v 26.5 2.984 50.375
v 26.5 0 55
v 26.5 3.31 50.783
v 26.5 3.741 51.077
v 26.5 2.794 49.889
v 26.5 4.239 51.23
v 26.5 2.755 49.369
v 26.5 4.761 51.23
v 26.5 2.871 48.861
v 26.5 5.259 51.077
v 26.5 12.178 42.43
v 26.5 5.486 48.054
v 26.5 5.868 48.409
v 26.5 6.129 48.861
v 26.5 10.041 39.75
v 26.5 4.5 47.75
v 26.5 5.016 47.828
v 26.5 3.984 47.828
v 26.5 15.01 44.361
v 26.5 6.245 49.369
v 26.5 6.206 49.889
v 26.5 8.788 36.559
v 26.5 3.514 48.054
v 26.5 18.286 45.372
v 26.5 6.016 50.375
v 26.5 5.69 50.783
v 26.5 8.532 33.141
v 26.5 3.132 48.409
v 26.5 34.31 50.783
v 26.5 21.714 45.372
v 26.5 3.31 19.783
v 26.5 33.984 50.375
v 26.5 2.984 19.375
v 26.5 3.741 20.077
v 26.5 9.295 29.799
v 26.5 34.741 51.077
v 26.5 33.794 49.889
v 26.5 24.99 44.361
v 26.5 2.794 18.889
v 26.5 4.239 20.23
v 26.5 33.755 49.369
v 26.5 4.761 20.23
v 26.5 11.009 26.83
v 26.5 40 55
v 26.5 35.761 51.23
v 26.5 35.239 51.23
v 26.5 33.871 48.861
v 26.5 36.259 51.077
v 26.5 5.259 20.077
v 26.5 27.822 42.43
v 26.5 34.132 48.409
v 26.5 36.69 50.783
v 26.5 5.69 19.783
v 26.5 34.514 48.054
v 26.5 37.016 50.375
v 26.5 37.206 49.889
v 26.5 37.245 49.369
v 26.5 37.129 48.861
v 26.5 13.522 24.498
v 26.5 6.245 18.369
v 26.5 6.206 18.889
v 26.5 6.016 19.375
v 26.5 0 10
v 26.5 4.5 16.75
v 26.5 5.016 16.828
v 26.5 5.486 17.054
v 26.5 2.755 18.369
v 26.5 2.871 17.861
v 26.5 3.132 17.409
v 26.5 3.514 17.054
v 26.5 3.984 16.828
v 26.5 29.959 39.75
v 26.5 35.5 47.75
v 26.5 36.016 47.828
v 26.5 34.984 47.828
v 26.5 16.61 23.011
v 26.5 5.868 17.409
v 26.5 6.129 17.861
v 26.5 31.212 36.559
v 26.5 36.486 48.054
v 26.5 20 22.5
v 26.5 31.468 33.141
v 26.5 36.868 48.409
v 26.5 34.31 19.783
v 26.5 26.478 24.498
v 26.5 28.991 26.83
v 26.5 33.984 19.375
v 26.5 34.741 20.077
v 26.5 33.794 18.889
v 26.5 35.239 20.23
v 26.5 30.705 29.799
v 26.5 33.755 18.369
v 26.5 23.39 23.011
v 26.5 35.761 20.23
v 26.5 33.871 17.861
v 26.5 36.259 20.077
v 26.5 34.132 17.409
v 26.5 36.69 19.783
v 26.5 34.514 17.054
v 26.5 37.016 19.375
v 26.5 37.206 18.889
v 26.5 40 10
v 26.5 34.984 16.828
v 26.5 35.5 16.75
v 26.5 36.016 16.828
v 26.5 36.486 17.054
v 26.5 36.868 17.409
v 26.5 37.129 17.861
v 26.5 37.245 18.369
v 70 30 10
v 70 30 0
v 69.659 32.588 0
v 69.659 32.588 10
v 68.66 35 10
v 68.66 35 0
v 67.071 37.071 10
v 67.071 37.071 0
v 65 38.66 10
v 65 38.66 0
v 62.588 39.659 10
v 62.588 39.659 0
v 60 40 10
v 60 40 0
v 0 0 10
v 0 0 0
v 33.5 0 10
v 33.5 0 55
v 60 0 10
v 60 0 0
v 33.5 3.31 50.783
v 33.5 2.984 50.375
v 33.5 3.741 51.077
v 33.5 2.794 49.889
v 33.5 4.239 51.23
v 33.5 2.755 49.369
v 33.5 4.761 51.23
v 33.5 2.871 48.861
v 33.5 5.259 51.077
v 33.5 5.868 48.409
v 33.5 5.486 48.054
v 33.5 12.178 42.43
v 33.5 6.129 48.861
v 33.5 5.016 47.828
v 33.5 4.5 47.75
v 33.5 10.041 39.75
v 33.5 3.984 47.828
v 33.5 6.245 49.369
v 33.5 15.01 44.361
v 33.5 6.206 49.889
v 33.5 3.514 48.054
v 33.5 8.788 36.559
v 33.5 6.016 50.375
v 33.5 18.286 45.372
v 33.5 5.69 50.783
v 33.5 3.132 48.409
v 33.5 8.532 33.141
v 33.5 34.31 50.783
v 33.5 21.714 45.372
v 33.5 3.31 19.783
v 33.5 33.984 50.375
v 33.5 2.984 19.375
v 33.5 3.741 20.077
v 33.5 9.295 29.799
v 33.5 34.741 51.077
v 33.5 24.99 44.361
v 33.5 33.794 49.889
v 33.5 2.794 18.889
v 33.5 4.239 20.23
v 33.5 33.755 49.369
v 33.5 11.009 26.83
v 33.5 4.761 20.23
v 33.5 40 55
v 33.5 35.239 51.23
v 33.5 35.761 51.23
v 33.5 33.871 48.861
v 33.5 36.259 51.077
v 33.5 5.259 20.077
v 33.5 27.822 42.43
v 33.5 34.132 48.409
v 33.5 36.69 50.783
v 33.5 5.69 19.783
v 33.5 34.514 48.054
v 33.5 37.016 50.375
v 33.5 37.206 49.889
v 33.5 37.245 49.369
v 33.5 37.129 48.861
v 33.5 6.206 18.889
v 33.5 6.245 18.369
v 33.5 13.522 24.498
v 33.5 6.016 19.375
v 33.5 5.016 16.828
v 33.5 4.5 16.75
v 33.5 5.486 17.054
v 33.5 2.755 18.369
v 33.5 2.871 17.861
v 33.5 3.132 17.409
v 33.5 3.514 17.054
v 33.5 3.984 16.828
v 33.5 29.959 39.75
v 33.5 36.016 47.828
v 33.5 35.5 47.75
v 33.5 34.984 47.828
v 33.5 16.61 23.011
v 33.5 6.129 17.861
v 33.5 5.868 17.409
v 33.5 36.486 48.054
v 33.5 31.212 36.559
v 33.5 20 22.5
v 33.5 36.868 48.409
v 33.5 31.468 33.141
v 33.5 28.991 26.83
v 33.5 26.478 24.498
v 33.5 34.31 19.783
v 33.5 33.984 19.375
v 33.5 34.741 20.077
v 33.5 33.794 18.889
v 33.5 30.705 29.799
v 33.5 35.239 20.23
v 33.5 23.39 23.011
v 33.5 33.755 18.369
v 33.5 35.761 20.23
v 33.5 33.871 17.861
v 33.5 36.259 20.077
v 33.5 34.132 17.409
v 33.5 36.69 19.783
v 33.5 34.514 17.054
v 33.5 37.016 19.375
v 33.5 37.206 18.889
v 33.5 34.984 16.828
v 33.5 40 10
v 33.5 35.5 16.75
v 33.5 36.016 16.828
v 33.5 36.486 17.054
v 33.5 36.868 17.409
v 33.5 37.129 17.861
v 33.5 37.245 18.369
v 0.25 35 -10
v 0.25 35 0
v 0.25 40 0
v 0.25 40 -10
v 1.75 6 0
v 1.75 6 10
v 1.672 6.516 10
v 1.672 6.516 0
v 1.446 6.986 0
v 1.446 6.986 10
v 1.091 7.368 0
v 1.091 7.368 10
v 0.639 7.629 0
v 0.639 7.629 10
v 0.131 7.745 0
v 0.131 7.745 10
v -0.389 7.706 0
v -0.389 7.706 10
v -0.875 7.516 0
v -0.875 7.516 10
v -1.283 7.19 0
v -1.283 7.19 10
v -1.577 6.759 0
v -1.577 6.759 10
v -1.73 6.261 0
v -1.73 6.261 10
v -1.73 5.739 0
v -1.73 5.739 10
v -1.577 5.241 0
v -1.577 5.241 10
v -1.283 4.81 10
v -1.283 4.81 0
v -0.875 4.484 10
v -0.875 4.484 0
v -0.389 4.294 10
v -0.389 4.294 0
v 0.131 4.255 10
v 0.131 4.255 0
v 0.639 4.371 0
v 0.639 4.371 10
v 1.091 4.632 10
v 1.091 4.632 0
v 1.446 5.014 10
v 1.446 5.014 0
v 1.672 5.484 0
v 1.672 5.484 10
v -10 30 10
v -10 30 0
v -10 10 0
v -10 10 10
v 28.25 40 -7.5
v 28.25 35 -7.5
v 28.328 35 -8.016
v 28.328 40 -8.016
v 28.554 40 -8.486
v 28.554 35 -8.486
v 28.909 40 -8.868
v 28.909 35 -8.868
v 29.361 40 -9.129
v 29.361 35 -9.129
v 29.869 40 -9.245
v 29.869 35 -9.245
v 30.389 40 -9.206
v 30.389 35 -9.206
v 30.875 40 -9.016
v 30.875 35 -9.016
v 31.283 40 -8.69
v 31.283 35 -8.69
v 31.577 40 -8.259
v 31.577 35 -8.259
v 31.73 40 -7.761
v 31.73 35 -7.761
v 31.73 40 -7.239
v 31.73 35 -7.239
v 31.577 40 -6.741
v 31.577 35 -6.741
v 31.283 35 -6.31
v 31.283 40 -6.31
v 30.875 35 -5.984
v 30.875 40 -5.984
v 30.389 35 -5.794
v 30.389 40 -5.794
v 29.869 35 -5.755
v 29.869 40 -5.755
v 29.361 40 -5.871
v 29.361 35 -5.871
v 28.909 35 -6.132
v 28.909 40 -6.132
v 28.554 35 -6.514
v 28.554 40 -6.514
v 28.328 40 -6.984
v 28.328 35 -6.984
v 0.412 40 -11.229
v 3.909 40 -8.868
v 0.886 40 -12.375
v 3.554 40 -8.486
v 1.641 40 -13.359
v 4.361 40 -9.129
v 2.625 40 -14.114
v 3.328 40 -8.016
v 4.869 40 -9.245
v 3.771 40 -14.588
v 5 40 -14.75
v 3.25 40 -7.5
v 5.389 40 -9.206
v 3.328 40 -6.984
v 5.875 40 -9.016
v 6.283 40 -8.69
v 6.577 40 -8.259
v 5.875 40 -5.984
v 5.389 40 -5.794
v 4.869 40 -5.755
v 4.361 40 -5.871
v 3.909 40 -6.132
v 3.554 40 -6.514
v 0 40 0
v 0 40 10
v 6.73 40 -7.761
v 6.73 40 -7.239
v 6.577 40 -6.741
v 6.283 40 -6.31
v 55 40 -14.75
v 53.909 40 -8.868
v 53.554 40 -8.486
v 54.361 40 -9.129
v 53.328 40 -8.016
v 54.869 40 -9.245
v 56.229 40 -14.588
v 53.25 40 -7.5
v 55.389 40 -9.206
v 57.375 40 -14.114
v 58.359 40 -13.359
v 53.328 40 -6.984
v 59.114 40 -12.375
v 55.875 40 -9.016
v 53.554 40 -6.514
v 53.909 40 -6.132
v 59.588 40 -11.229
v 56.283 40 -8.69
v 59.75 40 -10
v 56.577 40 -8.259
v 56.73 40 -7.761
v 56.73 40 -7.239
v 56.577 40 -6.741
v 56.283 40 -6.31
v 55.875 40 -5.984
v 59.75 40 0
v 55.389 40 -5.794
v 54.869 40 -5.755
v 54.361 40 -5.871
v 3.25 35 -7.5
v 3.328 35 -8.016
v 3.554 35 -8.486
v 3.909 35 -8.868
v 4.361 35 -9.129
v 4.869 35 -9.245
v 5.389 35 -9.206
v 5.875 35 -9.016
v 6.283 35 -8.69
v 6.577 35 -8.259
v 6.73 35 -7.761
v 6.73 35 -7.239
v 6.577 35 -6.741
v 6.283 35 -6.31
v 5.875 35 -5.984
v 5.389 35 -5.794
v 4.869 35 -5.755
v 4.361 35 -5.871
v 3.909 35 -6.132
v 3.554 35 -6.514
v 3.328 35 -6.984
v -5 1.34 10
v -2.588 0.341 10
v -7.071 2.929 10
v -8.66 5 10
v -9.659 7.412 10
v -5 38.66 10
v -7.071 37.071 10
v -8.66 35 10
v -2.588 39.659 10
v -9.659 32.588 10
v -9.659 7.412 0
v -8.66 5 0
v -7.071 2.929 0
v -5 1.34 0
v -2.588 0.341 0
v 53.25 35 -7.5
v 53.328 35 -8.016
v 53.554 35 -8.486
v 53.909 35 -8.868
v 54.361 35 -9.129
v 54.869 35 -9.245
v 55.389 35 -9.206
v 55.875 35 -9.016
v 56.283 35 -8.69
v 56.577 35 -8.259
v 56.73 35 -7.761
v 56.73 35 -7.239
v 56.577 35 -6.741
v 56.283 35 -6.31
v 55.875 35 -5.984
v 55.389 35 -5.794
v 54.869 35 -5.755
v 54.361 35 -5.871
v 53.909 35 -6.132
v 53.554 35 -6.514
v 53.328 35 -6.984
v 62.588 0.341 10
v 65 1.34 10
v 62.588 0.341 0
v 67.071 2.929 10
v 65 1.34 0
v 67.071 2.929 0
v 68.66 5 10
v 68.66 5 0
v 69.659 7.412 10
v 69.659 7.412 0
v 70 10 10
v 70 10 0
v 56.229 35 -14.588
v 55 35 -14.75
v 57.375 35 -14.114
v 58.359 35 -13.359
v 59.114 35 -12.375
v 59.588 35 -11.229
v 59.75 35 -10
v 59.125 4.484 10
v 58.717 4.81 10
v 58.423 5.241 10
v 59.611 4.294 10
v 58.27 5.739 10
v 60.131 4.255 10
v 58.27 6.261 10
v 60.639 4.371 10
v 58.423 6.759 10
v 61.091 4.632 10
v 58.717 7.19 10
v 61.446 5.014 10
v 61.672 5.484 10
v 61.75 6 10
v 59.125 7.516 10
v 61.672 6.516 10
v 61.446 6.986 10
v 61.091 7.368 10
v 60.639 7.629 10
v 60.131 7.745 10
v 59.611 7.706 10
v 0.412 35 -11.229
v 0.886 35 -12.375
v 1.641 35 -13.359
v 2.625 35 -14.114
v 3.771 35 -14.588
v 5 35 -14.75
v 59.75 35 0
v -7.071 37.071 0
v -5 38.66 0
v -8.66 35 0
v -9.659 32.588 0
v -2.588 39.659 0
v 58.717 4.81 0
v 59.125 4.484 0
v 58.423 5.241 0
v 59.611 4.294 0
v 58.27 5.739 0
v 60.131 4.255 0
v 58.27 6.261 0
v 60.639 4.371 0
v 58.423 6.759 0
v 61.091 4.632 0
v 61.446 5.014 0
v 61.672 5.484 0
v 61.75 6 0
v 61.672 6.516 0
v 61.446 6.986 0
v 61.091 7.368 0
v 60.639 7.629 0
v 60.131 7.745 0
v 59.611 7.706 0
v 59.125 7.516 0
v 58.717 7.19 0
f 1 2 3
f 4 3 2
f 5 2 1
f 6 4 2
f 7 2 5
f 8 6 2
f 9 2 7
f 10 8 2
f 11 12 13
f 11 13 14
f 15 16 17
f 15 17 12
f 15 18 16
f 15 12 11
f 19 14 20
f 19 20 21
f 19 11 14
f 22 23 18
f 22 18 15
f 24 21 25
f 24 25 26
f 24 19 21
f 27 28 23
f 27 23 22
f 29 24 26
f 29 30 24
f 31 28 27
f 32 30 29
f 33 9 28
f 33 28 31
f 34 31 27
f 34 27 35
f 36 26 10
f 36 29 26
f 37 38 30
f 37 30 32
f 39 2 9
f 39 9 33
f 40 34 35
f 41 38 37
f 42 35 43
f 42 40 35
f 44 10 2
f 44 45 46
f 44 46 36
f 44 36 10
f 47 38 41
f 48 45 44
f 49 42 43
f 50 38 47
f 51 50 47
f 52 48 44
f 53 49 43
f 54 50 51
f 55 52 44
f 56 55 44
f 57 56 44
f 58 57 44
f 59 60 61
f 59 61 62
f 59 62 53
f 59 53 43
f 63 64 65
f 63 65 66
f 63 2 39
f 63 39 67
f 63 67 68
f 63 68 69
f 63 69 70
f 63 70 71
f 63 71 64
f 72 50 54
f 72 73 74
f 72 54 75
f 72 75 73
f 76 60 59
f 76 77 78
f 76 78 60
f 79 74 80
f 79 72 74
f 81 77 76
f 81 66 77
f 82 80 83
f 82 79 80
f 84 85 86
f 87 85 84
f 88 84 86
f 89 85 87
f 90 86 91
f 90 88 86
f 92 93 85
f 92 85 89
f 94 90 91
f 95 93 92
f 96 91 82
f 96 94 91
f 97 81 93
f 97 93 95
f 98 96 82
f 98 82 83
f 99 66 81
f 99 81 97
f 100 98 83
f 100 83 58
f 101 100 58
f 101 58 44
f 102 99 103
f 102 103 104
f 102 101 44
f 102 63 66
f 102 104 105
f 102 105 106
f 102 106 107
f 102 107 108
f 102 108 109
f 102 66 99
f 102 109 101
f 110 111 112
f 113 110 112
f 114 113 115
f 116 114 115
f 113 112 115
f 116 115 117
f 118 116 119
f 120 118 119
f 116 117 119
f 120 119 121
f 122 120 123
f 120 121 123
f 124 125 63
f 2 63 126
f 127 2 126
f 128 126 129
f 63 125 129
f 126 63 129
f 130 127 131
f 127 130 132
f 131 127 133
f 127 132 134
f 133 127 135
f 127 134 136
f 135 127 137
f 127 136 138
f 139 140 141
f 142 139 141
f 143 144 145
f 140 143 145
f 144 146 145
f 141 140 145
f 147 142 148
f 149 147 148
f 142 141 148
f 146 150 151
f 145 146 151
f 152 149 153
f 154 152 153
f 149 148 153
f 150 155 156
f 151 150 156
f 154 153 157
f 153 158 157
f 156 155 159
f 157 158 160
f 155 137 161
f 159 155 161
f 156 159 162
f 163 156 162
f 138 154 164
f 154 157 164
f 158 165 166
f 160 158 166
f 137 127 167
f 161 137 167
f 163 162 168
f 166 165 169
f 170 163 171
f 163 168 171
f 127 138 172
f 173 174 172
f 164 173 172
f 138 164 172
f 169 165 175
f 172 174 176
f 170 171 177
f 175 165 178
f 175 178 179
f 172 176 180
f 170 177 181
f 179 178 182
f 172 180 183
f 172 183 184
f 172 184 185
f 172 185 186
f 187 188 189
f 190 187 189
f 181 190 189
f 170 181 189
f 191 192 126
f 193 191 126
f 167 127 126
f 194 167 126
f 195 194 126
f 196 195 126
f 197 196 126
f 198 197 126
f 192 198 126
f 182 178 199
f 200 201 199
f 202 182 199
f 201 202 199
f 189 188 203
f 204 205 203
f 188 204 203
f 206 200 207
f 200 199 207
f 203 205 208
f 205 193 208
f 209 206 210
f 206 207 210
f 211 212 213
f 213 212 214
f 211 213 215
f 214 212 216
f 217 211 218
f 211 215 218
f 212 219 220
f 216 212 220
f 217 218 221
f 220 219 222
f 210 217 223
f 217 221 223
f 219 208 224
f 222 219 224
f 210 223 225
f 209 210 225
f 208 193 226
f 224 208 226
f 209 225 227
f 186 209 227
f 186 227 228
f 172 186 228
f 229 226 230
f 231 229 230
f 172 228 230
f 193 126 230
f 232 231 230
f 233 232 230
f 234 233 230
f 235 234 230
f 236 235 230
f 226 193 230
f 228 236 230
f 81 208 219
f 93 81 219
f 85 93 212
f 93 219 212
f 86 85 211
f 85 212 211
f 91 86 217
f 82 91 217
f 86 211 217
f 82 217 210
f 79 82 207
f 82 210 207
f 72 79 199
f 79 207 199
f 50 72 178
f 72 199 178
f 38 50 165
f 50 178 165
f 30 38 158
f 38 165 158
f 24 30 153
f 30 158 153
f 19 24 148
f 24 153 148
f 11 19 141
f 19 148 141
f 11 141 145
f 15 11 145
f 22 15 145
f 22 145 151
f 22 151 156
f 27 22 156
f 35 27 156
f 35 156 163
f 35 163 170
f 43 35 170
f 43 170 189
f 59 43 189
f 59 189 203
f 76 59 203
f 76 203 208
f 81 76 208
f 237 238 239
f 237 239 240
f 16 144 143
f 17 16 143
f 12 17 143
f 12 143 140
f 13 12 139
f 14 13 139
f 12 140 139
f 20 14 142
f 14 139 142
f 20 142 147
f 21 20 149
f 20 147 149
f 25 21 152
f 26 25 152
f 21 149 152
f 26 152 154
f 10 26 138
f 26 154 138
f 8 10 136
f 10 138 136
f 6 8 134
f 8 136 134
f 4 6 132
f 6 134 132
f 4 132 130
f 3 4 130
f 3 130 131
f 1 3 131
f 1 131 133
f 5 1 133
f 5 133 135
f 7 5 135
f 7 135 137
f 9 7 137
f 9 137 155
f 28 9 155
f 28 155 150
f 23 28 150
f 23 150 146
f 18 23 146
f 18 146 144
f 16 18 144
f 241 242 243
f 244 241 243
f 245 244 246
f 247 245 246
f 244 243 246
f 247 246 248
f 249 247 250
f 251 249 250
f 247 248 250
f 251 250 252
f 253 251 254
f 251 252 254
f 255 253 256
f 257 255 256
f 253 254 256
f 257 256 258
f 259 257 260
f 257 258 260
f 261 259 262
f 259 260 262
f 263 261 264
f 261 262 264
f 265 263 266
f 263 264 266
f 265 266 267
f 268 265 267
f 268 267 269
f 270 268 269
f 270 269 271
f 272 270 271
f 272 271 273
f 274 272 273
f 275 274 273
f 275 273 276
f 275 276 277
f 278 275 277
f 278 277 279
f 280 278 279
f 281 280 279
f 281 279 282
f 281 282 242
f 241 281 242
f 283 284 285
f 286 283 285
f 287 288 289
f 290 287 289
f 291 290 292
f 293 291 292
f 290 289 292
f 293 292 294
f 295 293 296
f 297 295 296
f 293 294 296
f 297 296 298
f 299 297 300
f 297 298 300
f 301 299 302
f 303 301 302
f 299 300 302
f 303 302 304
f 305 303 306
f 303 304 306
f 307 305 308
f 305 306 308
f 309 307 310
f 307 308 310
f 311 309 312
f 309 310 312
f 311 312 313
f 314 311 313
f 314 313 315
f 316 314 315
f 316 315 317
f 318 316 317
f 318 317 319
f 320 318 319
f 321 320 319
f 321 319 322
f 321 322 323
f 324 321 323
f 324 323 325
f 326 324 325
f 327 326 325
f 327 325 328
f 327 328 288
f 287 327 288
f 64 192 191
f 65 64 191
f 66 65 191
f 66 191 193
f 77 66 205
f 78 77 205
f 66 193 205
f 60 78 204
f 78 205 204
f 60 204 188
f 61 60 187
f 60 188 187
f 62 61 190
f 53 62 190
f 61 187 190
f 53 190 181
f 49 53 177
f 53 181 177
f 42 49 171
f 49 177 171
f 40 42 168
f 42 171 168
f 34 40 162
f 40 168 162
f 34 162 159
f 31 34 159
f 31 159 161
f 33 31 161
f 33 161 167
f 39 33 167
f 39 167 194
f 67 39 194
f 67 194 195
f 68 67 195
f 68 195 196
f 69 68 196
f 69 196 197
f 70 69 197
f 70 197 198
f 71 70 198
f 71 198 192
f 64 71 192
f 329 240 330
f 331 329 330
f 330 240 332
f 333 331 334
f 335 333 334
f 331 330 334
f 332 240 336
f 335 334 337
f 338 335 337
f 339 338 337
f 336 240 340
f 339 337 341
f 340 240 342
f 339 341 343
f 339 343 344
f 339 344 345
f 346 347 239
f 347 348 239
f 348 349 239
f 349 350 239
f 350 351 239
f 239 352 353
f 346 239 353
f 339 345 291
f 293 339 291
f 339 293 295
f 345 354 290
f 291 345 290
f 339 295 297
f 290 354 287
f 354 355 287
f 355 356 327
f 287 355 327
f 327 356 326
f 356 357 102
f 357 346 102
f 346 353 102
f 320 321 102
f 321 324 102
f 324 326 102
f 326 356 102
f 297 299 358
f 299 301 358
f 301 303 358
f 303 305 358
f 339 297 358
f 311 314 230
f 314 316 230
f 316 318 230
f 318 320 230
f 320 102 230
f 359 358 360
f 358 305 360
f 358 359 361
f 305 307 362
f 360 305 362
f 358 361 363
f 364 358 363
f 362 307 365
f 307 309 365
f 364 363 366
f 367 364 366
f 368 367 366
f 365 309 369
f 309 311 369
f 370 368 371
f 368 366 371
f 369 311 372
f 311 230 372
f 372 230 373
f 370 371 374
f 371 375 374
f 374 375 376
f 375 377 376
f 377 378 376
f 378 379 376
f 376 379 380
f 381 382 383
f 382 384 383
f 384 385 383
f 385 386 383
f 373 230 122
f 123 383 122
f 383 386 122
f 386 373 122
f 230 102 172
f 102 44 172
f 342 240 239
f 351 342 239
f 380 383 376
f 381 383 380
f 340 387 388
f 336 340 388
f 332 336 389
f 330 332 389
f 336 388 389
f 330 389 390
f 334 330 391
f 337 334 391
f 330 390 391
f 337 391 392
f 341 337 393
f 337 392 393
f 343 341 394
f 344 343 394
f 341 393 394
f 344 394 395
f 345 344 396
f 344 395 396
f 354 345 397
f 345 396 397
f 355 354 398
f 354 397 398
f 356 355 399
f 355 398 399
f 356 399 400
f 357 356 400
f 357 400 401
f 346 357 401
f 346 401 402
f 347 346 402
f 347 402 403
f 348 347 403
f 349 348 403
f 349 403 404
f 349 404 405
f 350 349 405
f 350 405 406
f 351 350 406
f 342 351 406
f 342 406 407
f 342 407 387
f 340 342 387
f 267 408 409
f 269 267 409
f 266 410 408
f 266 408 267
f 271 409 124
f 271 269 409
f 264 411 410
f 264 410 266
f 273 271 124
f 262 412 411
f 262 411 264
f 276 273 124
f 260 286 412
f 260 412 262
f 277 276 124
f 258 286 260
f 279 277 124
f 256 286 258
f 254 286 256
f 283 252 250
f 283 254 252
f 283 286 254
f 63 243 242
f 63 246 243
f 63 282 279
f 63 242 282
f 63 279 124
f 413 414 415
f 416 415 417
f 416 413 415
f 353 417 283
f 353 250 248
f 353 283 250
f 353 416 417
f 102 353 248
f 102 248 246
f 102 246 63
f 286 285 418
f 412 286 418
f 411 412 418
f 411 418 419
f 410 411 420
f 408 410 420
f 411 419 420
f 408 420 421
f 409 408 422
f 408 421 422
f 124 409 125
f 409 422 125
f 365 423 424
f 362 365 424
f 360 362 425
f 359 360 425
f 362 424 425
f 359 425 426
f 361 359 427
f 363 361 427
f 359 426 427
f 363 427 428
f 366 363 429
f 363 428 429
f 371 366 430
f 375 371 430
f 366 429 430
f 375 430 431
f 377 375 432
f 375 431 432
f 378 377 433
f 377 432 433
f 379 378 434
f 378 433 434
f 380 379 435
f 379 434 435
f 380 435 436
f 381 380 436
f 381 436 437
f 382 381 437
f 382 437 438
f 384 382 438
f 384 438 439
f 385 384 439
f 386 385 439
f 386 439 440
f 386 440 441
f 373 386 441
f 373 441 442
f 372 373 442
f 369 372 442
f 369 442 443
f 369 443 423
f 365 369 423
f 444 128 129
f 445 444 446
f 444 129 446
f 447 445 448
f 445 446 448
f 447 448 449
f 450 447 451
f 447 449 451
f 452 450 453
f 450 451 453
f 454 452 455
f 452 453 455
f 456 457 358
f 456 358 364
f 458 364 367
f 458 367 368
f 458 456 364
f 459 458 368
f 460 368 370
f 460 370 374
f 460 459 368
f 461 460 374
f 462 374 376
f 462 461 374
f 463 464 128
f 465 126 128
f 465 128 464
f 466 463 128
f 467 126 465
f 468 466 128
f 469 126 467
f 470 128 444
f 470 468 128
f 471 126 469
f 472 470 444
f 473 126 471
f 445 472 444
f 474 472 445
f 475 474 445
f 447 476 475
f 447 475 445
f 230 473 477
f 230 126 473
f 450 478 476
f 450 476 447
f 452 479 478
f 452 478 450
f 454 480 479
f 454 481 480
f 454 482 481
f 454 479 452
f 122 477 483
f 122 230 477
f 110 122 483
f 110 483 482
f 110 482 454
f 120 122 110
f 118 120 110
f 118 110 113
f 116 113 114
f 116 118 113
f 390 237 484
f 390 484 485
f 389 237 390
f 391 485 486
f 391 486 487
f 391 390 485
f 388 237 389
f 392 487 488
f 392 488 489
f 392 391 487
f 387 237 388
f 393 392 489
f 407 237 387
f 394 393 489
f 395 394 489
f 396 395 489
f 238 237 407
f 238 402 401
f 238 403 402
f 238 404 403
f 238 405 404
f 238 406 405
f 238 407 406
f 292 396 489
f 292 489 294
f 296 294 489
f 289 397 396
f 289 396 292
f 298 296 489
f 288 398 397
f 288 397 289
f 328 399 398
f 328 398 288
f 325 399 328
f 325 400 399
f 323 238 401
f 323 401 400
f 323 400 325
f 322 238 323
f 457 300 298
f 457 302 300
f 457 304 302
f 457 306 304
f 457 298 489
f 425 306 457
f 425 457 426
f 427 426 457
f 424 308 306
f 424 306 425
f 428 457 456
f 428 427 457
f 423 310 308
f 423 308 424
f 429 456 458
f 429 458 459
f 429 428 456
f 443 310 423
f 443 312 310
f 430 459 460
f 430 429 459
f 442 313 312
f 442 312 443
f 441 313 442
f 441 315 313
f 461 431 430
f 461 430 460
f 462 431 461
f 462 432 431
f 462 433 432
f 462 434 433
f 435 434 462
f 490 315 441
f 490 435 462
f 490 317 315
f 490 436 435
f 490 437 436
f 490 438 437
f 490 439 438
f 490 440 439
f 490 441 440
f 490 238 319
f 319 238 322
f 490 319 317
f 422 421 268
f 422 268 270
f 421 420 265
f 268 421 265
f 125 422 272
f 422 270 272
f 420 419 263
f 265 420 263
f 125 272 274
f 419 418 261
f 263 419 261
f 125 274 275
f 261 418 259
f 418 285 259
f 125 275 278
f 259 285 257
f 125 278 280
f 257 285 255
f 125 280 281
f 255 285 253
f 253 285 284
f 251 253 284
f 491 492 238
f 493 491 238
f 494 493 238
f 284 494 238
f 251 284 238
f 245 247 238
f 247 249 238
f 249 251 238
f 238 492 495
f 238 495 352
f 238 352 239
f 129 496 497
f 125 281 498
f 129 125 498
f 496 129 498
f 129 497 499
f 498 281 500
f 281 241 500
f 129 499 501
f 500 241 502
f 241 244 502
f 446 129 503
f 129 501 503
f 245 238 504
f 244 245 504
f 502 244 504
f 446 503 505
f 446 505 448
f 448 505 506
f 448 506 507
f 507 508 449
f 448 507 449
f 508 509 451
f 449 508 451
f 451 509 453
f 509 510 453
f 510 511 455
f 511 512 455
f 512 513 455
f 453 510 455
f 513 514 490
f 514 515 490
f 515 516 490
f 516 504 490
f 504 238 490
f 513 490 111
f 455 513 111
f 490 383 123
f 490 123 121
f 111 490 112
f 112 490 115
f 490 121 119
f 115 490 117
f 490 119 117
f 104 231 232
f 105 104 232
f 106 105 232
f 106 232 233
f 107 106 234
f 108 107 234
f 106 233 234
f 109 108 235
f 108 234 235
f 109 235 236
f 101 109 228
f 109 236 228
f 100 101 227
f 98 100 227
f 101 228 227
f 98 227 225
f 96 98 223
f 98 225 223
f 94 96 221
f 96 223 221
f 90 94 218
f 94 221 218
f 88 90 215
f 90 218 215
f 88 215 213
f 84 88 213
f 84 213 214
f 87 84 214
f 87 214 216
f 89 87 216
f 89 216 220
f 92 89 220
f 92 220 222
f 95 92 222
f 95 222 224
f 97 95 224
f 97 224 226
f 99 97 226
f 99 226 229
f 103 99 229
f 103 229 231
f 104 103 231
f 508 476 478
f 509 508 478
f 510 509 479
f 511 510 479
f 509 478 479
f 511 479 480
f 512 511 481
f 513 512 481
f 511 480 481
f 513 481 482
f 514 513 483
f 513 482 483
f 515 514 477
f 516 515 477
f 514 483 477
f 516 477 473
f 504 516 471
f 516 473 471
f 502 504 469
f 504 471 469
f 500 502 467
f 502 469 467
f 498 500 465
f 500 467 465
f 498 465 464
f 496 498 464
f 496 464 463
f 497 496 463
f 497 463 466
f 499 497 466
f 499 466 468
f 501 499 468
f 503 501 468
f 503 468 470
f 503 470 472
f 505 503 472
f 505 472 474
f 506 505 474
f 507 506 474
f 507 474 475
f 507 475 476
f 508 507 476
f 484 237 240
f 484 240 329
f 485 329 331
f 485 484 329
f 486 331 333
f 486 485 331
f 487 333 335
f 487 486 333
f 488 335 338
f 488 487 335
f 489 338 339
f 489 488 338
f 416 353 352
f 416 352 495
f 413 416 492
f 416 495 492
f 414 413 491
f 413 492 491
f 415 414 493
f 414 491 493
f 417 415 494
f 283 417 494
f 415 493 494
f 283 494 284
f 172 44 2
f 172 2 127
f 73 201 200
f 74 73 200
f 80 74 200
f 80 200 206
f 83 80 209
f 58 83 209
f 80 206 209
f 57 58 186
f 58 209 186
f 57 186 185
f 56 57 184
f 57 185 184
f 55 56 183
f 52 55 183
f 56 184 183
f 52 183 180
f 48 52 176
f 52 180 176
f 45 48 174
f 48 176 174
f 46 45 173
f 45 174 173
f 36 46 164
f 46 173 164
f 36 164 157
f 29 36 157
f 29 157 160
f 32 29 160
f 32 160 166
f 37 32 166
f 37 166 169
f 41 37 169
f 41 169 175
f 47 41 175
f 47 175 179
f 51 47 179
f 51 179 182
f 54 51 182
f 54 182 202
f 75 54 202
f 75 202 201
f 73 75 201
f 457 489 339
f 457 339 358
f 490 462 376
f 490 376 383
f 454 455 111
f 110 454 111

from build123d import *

# Parameters (mm, degrees)
BOSS_EXTRUDE1_DEPTH = 10
SKETCH2_W           = 60
SKETCH2_H           = 5
BOSS_EXTRUDE2_DEPTH = 25
FILLET1_R           = 5
SKETCH3_R           = 1.75
CUT_EXTRUDE1_DEPTH  = 25
SKETCH4_R           = 1.75
CUT_EXTRUDE2_DEPTH  = 25
CUT_EXTRUDE3_DEPTH  = 25
SKETCH6_W           = 7
SKETCH6_H           = 40
BOSS_EXTRUDE3_DEPTH = 45
SKETCH7_R           = 11.5
SKETCH7_R_2         = 1.75
CUT_EXTRUDE4_DEPTH  = 45


with BuildPart() as part:
    # Sketch1 → Boss-Extrude1 (new body)
    with BuildSketch(Plane.XY):
        with BuildLine():
            Line((60, 35), (0, 35))
            Line((0, 35), (0, 40))
            ThreePointArc((0, 40), (-7.071067812, 37.071067812), (-10, 30))
            Line((-10, 30), (-10, 10))
            ThreePointArc((-10, 10), (-7.071067812, 2.928932188), (0, 0))
            Line((0, 0), (60, 0))
            ThreePointArc((60, 0), (67.071067812, 2.928932188), (70, 10))
            Line((70, 10), (70, 30))
            ThreePointArc((70, 30), (67.071067812, 37.071067812), (60, 40))
            Line((60, 40), (60, 35))
        make_face()
    extrude(amount=BOSS_EXTRUDE1_DEPTH)

    # Sketch2 → Boss-Extrude2 (add)
    with BuildSketch(Plane.XY.offset(10)):
        with Locations((30, 37.5)):
            Rectangle(SKETCH2_W, SKETCH2_H)
    extrude(amount=-BOSS_EXTRUDE2_DEPTH)

    # Fillet1
    fillet1_edges = [part.edges().sort_by_distance(p)[0] for p in [
        (0, 37.5, -15),
        (60, 37.5, -15),
    ]]
    fillet(fillet1_edges, radius=FILLET1_R)

    # Sketch3 → Cut-Extrude1 (cut)
    with BuildSketch(Plane.XY.offset(10)):
        with Locations((0, 6)):
            Circle(SKETCH3_R)
        with Locations((60, 6)):
            Circle(SKETCH3_R)
    extrude(amount=-CUT_EXTRUDE1_DEPTH, mode=Mode.SUBTRACT)

    # Sketch4 → Cut-Extrude2 (cut)
    with BuildSketch(Plane(origin=(0, 35, 0), x_dir=(-1, 0, 0), z_dir=(0, -1, 0))):
        with Locations((-55, 7.5)):
            Circle(SKETCH4_R)
        with Locations((-30, 7.5)):
            Circle(SKETCH4_R)
        with Locations((-5, 7.5)):
            Circle(SKETCH4_R)
    extrude(amount=-CUT_EXTRUDE2_DEPTH, mode=Mode.SUBTRACT)

    # Sketch5 → Cut-Extrude3 (cut)
    with BuildSketch(Plane.XZ.offset(-35)):
        with BuildLine():
            Line((5, -14.75), (55, -14.75))
            ThreePointArc((55, -14.75), (58.358757211, -13.358757211), (59.75, -10))
            Line((59.75, -10), (59.75, -0.25))
            Line((59.75, -0.25), (59.75, 0))
            Line((59.75, 0), (60, 0))
            Line((60, 0), (60, -10))
            ThreePointArc((60, -10), (58.535533906, -13.535533906), (55, -15))
            Line((55, -15), (5, -15))
            ThreePointArc((5, -15), (1.464466094, -13.535533906), (0, -10))
            Line((0, -10), (0, 0))
            Line((0, 0), (0.25, 0))
            Line((0.25, 0), (0.25, -0.25))
            Line((0.25, -0.25), (0.25, -10))
            ThreePointArc((0.25, -10), (1.641242789, -13.358757211), (5, -14.75))
        make_face()
    extrude(amount=-CUT_EXTRUDE3_DEPTH, mode=Mode.SUBTRACT)

    # Sketch6 → Boss-Extrude3 (add)
    with BuildSketch(Plane.XY.offset(10)):
        with Locations((30, 20)):
            Rectangle(SKETCH6_W, SKETCH6_H)
    extrude(amount=BOSS_EXTRUDE3_DEPTH)

    # Sketch7 → Cut-Extrude4 (cut)
    with BuildSketch(Plane(origin=(33.5, 0, 0), x_dir=(0, 0, -1), z_dir=(1, 0, 0))):
        with Locations((-34, 20)):
            Circle(SKETCH7_R)
        with Locations((-49.5, 35.5)):
            Circle(SKETCH7_R_2)
        with Locations((-18.5, 35.5)):
            Circle(SKETCH7_R_2)
        with Locations((-18.5, 4.5)):
            Circle(SKETCH7_R_2)
        with Locations((-49.5, 4.5)):
            Circle(SKETCH7_R_2)
    extrude(amount=-CUT_EXTRUDE4_DEPTH, mode=Mode.SUBTRACT)


solid = part.part
